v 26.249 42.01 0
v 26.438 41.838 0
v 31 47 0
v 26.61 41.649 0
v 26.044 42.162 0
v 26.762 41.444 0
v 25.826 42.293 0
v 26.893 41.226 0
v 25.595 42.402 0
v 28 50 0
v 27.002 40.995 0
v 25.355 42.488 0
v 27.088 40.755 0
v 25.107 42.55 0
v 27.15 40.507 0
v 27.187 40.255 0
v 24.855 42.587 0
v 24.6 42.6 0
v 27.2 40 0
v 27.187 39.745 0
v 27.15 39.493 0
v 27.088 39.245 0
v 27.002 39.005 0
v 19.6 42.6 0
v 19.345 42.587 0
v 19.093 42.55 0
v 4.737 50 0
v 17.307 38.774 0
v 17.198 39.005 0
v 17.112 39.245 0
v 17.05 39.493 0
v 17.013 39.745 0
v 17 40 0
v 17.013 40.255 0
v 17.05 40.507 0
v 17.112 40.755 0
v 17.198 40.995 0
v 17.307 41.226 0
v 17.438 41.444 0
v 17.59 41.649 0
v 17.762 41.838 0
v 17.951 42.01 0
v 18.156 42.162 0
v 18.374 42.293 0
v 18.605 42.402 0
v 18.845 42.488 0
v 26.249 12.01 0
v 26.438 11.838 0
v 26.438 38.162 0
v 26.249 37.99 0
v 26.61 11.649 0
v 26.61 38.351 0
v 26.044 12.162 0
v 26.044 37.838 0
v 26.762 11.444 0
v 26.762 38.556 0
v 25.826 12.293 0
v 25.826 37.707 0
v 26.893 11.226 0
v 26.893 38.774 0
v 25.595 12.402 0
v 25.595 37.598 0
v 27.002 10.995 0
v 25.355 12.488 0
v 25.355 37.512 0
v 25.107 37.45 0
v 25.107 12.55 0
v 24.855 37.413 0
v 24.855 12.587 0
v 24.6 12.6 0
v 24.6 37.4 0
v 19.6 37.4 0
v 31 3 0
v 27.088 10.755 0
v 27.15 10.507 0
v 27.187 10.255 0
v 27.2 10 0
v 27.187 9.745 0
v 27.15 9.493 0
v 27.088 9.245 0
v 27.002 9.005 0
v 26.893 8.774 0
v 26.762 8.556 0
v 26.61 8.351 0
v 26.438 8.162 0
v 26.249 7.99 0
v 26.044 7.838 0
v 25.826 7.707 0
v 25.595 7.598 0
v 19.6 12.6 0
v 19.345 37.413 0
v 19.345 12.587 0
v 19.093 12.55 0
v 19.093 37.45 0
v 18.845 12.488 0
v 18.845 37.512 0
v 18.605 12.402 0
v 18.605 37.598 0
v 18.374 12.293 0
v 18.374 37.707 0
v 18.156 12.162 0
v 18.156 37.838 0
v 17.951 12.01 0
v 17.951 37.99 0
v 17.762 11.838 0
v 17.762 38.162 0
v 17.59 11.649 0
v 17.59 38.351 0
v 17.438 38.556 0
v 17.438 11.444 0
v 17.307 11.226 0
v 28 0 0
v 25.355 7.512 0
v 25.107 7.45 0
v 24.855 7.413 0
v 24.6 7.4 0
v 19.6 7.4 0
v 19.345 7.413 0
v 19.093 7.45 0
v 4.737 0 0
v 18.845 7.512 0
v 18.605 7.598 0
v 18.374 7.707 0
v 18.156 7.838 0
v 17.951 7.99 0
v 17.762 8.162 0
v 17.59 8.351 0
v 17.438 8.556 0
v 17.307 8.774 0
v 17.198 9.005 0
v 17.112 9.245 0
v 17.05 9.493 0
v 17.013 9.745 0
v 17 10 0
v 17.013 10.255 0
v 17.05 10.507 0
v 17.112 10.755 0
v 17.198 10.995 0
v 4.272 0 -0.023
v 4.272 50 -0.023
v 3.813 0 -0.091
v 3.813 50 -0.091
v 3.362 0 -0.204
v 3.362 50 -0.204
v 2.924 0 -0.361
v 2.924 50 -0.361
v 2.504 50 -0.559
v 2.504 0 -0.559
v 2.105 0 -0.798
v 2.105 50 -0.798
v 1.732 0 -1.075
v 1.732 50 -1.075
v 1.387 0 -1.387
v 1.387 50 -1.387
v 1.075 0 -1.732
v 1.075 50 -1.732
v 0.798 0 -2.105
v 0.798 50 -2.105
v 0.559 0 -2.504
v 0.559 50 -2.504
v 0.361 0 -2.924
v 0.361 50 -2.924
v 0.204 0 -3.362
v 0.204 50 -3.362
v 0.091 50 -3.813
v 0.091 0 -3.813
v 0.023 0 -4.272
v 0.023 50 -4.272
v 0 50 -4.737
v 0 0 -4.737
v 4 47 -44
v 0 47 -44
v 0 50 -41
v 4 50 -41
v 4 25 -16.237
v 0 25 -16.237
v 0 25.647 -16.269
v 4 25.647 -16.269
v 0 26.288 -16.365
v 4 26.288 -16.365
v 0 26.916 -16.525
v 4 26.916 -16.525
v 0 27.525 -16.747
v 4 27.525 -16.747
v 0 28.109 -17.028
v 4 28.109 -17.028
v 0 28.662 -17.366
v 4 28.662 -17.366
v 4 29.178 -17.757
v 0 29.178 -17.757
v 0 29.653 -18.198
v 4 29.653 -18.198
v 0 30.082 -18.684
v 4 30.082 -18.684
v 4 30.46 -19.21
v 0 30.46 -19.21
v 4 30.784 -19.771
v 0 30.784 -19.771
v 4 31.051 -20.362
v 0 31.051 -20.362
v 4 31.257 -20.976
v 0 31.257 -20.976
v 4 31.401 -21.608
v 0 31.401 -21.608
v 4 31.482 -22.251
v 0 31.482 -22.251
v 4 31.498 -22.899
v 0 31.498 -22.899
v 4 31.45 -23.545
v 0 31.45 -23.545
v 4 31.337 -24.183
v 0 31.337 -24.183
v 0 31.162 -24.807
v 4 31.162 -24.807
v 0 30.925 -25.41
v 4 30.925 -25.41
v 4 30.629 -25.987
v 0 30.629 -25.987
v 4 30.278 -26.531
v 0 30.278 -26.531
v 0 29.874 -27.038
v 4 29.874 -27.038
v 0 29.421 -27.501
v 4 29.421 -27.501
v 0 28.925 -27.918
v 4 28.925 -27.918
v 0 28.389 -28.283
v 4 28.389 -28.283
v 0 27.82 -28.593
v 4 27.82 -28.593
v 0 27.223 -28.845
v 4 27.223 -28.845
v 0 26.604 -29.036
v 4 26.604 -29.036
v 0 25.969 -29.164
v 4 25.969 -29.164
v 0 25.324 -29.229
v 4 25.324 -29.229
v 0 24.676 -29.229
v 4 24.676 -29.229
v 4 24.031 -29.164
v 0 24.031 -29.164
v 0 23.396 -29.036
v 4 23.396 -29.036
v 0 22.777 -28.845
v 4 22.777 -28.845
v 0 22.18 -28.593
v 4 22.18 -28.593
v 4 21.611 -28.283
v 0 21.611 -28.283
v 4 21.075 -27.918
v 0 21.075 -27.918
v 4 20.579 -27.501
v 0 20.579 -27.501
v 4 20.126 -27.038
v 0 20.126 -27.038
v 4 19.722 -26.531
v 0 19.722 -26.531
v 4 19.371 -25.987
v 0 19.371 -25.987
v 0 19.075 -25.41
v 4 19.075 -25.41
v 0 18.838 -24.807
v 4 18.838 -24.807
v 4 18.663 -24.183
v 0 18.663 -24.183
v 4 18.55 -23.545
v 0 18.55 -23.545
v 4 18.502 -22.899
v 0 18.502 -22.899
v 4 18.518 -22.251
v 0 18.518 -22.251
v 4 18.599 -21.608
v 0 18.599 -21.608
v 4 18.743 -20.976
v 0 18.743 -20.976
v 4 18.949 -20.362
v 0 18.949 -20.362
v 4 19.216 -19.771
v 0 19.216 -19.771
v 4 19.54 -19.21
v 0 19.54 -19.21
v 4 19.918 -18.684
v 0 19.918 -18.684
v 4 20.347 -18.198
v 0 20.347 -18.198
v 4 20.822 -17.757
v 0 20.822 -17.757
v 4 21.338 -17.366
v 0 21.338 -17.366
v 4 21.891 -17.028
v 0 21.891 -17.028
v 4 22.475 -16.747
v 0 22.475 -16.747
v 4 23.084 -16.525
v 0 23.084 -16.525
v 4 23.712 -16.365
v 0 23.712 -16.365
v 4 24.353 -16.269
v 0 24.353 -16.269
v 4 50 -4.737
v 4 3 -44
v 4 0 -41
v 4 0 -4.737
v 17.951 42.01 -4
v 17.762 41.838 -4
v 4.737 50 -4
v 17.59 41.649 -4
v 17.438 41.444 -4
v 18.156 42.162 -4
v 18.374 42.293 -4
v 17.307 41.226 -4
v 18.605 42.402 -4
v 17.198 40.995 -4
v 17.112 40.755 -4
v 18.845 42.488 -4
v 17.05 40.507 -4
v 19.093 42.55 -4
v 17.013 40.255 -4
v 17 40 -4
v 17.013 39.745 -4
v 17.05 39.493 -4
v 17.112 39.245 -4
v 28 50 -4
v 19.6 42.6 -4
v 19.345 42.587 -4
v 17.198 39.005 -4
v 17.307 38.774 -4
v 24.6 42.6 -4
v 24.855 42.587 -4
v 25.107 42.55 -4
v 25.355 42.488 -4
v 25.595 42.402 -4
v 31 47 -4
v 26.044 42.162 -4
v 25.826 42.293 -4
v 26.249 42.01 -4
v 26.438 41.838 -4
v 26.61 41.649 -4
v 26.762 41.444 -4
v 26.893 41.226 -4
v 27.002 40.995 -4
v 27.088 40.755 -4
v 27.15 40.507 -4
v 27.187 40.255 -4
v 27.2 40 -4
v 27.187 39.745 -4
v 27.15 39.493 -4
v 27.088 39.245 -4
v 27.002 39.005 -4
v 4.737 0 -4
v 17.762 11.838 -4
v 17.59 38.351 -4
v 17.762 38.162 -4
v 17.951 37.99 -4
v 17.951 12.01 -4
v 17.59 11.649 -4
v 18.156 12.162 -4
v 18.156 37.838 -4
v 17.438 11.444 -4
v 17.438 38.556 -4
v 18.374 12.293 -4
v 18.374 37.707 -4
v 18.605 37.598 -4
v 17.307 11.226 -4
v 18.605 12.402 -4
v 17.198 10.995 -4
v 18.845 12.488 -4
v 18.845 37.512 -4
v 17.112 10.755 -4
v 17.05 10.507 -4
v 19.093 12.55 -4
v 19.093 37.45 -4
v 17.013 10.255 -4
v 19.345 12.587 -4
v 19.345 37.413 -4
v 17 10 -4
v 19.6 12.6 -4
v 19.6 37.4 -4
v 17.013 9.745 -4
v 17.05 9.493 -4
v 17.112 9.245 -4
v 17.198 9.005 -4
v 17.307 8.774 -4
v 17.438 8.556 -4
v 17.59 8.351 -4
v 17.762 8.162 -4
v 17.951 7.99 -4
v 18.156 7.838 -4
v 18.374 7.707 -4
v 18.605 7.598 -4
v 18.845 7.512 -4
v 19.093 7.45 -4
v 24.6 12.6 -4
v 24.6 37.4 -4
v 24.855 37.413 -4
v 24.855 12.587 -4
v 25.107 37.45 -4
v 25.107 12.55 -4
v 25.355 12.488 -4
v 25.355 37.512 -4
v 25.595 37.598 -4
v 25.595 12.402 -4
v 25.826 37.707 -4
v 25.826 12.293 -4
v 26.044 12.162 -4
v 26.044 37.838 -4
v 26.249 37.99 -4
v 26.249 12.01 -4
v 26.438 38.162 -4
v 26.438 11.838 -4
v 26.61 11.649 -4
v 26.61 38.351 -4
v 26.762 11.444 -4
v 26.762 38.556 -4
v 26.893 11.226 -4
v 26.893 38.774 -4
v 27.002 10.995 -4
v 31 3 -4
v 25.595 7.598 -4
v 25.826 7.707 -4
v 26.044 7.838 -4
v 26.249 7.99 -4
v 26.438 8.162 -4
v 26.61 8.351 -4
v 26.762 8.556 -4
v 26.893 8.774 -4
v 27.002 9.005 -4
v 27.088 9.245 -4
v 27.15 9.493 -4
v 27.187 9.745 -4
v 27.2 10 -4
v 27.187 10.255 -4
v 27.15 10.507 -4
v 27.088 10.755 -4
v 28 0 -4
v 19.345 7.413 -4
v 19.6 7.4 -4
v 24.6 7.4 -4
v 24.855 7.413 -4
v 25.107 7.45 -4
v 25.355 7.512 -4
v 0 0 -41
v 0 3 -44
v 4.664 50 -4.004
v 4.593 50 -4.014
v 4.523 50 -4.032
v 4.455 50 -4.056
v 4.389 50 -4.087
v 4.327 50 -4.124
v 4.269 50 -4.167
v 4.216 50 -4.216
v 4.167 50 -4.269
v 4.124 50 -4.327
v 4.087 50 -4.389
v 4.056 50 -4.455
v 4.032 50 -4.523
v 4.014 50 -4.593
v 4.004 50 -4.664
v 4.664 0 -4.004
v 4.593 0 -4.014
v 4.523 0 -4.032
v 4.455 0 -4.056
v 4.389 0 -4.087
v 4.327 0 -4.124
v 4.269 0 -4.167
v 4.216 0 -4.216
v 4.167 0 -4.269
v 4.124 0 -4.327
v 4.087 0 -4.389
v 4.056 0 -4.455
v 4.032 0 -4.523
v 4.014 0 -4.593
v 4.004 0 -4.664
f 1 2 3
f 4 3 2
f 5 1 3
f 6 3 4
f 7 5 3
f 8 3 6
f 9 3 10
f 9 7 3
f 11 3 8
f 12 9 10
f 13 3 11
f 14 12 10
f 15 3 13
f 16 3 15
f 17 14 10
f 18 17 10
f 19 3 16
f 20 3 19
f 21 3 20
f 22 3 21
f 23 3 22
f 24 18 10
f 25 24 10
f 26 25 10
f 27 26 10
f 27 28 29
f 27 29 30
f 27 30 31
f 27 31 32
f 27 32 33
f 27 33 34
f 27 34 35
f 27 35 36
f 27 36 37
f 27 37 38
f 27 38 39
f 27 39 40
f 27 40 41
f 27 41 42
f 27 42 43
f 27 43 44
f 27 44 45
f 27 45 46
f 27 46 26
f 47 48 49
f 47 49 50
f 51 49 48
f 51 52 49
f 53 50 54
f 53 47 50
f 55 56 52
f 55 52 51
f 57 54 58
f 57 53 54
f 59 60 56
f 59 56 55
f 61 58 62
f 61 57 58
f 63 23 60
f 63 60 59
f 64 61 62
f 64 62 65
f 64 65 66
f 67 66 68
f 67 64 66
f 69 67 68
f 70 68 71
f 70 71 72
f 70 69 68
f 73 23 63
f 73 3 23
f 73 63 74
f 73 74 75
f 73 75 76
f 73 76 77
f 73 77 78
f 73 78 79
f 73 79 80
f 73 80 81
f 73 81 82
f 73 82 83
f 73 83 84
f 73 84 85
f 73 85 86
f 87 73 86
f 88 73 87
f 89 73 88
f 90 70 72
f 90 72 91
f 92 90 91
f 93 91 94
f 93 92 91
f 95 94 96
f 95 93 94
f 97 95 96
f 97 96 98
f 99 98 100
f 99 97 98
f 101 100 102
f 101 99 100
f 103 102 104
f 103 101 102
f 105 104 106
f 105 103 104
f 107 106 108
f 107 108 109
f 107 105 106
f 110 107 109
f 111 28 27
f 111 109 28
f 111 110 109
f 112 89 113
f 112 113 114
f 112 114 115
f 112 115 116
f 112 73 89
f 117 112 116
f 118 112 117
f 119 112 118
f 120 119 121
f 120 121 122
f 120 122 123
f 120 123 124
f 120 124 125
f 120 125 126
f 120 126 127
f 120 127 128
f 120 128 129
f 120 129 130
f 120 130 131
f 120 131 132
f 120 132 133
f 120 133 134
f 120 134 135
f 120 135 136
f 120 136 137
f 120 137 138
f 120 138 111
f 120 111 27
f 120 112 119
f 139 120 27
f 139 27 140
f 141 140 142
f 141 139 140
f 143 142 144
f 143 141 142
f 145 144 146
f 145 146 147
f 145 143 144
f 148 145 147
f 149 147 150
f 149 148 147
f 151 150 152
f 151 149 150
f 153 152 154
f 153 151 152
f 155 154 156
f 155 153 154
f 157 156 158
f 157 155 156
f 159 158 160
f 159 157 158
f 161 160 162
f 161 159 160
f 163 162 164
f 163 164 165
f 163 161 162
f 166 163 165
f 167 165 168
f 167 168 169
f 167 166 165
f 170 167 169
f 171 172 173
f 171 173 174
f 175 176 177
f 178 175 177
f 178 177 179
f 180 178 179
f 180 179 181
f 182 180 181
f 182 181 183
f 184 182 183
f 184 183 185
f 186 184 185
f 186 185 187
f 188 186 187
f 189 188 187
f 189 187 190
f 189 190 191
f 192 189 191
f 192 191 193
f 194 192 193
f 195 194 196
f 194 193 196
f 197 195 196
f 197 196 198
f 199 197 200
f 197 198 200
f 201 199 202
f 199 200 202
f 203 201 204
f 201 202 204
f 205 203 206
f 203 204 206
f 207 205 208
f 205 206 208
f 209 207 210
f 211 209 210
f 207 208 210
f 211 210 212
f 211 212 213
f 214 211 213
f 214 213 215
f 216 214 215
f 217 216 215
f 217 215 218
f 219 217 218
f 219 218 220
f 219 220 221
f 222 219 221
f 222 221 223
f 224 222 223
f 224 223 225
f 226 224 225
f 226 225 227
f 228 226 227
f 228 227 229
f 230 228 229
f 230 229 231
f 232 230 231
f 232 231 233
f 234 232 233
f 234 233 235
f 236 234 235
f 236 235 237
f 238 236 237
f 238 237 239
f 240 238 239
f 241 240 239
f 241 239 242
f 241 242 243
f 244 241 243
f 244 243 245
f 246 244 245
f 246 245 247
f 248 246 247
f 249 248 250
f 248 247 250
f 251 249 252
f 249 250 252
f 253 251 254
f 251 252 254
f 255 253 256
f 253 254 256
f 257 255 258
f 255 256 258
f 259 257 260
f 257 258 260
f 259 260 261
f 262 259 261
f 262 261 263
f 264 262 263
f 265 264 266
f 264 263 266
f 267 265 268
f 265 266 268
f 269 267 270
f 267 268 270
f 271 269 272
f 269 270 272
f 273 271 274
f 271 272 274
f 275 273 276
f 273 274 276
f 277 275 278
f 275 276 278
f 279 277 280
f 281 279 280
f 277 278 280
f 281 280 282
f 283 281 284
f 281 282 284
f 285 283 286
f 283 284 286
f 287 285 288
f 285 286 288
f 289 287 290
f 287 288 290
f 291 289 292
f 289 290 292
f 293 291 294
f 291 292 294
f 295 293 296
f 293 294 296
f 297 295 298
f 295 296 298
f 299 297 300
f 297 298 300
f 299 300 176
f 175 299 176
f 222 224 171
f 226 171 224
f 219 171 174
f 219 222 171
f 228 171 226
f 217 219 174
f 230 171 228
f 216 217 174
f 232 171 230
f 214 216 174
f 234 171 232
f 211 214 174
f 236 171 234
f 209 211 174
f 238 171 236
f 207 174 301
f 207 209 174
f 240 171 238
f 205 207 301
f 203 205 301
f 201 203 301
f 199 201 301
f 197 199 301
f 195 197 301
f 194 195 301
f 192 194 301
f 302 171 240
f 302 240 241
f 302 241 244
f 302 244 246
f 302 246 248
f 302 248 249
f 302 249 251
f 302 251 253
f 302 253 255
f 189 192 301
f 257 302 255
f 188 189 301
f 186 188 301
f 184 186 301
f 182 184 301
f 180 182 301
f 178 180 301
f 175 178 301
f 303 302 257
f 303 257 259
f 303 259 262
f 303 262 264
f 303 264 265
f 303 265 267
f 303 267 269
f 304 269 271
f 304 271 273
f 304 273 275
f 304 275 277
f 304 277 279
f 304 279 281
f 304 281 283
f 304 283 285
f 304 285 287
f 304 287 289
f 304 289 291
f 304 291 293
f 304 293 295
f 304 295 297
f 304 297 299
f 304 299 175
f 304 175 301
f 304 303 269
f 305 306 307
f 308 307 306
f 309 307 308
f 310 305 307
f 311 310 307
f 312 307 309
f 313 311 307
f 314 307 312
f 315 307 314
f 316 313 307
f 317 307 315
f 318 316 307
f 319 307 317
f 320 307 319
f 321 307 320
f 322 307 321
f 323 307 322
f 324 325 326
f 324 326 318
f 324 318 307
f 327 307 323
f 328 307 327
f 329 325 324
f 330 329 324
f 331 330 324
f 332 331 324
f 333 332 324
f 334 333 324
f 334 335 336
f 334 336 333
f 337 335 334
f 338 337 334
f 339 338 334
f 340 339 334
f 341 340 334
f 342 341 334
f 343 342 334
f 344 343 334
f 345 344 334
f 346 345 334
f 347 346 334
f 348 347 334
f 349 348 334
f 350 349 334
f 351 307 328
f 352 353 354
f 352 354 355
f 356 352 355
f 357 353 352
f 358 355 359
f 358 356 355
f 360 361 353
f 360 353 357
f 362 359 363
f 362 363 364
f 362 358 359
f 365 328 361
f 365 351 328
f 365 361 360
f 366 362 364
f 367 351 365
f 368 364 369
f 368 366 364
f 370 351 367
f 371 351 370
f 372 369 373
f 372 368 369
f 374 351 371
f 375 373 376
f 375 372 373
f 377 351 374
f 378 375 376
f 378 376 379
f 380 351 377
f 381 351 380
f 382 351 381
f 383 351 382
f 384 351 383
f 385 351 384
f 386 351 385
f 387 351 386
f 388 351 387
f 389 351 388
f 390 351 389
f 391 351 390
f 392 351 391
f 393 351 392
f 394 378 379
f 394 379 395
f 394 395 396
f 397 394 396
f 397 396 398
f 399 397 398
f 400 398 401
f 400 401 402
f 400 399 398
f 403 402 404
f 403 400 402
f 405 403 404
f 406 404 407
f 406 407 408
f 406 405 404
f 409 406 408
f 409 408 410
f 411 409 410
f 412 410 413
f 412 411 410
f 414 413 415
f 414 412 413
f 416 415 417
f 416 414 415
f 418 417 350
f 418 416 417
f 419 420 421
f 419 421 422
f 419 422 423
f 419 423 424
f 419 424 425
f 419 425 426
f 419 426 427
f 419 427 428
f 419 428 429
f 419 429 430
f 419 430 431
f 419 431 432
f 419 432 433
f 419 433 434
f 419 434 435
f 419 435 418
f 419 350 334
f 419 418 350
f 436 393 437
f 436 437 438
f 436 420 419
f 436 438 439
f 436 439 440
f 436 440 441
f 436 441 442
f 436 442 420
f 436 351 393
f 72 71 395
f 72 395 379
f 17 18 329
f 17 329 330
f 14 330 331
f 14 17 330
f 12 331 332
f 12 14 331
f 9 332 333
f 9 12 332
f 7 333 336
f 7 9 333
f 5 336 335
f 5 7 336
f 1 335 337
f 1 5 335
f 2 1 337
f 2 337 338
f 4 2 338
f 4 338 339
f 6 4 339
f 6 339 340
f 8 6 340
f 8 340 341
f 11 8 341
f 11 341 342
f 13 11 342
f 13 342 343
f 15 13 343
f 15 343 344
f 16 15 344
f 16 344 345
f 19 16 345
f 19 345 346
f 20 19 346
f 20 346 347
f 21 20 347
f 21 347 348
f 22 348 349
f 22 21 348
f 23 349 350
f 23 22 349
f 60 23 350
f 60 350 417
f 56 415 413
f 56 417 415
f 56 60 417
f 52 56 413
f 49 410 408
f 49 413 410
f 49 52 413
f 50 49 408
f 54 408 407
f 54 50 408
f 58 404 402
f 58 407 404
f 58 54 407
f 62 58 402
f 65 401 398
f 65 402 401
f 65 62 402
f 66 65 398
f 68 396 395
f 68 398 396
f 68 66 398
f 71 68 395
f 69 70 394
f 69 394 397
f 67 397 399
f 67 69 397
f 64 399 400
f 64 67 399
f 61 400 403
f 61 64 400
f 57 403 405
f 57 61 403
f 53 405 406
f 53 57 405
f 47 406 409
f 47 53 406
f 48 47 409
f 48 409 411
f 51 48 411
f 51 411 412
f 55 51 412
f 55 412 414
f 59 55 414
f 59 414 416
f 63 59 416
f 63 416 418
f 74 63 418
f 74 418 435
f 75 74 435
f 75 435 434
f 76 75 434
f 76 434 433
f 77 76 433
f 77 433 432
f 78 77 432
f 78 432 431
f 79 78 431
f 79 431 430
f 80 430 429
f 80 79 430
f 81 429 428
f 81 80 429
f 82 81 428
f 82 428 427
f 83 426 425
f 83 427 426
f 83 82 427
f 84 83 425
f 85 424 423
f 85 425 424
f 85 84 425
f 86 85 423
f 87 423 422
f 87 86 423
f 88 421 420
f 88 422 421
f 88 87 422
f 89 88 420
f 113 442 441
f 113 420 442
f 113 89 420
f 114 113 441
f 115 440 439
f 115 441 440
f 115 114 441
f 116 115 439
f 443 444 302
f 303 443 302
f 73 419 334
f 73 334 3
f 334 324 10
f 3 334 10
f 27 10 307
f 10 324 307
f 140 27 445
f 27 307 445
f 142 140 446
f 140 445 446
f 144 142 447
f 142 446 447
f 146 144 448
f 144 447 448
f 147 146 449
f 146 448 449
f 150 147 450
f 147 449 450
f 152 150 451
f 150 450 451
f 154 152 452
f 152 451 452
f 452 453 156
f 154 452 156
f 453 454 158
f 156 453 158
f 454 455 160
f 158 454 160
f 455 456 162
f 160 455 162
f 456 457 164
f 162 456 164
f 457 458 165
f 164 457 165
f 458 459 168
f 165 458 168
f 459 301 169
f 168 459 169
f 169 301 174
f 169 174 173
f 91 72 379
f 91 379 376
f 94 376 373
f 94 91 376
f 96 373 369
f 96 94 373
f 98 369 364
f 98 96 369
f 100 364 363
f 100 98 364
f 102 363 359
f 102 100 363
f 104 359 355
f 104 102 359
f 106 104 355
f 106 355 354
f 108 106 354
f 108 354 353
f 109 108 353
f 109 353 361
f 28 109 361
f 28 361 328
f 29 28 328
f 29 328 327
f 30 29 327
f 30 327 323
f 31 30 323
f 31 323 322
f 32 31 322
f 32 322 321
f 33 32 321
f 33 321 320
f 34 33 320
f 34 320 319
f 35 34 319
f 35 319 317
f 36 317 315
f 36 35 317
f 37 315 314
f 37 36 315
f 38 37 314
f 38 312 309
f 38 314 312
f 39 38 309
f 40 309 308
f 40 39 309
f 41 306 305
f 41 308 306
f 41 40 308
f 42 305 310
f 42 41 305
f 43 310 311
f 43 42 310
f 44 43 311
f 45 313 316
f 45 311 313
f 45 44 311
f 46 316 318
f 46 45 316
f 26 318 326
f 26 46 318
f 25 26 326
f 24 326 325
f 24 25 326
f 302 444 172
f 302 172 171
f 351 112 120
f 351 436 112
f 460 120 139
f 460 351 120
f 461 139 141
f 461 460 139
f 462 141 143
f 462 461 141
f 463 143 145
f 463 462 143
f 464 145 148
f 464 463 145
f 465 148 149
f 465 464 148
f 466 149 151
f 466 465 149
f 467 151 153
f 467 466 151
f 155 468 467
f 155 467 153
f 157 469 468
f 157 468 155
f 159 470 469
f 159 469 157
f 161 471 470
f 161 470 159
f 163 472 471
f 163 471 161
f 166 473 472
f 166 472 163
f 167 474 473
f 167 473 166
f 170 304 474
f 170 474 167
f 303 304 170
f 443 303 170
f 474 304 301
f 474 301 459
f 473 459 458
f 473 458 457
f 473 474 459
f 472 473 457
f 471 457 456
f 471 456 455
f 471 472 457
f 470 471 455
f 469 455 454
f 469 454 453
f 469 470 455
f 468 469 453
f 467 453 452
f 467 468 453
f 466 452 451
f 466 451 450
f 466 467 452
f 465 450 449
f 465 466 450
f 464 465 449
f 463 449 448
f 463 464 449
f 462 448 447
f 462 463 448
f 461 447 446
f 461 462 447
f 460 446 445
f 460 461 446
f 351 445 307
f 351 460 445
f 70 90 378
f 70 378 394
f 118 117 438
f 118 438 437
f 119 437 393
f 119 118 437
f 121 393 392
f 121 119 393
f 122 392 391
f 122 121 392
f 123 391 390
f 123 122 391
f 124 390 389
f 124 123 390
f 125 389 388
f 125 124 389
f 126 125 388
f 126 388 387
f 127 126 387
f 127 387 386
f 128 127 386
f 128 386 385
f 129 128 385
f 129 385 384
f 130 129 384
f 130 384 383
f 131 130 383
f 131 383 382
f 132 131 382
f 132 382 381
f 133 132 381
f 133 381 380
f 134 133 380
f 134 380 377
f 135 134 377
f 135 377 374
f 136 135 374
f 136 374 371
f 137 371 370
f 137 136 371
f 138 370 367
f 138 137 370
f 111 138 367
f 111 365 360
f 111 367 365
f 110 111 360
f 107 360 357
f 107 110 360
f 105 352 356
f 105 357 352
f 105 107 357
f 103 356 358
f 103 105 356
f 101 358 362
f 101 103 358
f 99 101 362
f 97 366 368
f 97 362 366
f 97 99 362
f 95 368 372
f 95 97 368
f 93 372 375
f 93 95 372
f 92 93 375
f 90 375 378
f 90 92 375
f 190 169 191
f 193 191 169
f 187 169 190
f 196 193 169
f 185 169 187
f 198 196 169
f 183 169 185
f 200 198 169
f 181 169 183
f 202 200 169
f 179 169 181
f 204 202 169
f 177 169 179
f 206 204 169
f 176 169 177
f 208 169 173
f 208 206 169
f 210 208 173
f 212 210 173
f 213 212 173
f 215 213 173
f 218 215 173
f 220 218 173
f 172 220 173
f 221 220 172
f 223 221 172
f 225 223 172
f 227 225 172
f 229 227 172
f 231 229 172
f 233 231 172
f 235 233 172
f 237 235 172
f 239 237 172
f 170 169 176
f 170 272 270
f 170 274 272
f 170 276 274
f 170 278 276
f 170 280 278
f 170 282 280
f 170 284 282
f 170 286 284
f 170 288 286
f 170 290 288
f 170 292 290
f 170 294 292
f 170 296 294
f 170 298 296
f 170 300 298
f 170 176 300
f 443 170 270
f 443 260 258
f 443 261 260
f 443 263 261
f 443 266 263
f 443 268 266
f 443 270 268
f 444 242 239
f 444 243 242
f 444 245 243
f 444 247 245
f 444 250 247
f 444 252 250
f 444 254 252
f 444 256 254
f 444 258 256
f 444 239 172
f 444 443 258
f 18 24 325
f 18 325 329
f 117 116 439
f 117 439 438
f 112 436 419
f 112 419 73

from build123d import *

# Parameters (mm, degrees)
SM_BASE_FLANGE_1_DEPTH = 50
SKETCH_3_R             = 6.5
CUT_EXTRUDE_2_DEPTH    = 74.464277033
CHAMFER_1_SIZE         = 3
CUT_EXTRUDE_3_DEPTH    = 74.464277033
PATTERN_LINEAR_1_COUNT = 2
PATTERN_LINEAR_1_PITCH = 30


# Sheet-metal steps are written as plain solids
with BuildPart() as part:
    # Sketch 1 → 基材-凸緣1 (new body)
    with BuildSketch(Plane(origin=(0, 0, 0), x_dir=(1, 0, 0), z_dir=(0, 1, 0))):
        with BuildLine():
            Line((31, 0), (4.7366, 0))
            ThreePointArc((4.7366, 0), (1.38731802, 1.38731802), (0, 4.7366))
            Line((0, 4.7366), (0, 44))
            Line((0, 44), (4, 44))
            Line((4, 44), (4, 4.7366))
            ThreePointArc((4, 4.7366), (4.215745145, 4.215745145), (4.7366, 4))
            Line((4.7366, 4), (31, 4))
            Line((31, 4), (31, 0))
        make_face()
    extrude(amount=SM_BASE_FLANGE_1_DEPTH)

    # Sketch 3 → 除料-伸長2 (cut, through all)
    with BuildSketch(Plane.ZY):
        with Locations((-22.7366, 25)):
            Circle(SKETCH_3_R)
    extrude(amount=-CUT_EXTRUDE_2_DEPTH, mode=Mode.SUBTRACT)

    # 導角1
    chamfer_1_edges = [part.edges().sort_by_distance(p)[0] for p in [
        (31, 50, -2),
        (31, 0, -2),
        (2, 50, -44),
        (2, 0, -44),
    ]]
    chamfer(chamfer_1_edges, length=CHAMFER_1_SIZE)

    # 草圖4 → 除料-伸長3 (cut, through all)
    with BuildSketch(Plane.XY):
        with BuildLine():
            Line((24.6, 7.4), (19.6, 7.4))
            ThreePointArc((19.6, 7.4), (17, 10), (19.6, 12.6))
            Line((19.6, 12.6), (24.6, 12.6))
            ThreePointArc((24.6, 12.6), (27.2, 10), (24.6, 7.4))
        make_face()
    cut_extrude_3 = extrude(amount=-CUT_EXTRUDE_3_DEPTH, mode=Mode.SUBTRACT)

    # 直線複製排列1: 除料-伸長3 ×2
    with Locations(*[(0, i * PATTERN_LINEAR_1_PITCH, 0) for i in range(1, PATTERN_LINEAR_1_COUNT)]):
        add(cut_extrude_3, mode=Mode.SUBTRACT)


solid = part.part
